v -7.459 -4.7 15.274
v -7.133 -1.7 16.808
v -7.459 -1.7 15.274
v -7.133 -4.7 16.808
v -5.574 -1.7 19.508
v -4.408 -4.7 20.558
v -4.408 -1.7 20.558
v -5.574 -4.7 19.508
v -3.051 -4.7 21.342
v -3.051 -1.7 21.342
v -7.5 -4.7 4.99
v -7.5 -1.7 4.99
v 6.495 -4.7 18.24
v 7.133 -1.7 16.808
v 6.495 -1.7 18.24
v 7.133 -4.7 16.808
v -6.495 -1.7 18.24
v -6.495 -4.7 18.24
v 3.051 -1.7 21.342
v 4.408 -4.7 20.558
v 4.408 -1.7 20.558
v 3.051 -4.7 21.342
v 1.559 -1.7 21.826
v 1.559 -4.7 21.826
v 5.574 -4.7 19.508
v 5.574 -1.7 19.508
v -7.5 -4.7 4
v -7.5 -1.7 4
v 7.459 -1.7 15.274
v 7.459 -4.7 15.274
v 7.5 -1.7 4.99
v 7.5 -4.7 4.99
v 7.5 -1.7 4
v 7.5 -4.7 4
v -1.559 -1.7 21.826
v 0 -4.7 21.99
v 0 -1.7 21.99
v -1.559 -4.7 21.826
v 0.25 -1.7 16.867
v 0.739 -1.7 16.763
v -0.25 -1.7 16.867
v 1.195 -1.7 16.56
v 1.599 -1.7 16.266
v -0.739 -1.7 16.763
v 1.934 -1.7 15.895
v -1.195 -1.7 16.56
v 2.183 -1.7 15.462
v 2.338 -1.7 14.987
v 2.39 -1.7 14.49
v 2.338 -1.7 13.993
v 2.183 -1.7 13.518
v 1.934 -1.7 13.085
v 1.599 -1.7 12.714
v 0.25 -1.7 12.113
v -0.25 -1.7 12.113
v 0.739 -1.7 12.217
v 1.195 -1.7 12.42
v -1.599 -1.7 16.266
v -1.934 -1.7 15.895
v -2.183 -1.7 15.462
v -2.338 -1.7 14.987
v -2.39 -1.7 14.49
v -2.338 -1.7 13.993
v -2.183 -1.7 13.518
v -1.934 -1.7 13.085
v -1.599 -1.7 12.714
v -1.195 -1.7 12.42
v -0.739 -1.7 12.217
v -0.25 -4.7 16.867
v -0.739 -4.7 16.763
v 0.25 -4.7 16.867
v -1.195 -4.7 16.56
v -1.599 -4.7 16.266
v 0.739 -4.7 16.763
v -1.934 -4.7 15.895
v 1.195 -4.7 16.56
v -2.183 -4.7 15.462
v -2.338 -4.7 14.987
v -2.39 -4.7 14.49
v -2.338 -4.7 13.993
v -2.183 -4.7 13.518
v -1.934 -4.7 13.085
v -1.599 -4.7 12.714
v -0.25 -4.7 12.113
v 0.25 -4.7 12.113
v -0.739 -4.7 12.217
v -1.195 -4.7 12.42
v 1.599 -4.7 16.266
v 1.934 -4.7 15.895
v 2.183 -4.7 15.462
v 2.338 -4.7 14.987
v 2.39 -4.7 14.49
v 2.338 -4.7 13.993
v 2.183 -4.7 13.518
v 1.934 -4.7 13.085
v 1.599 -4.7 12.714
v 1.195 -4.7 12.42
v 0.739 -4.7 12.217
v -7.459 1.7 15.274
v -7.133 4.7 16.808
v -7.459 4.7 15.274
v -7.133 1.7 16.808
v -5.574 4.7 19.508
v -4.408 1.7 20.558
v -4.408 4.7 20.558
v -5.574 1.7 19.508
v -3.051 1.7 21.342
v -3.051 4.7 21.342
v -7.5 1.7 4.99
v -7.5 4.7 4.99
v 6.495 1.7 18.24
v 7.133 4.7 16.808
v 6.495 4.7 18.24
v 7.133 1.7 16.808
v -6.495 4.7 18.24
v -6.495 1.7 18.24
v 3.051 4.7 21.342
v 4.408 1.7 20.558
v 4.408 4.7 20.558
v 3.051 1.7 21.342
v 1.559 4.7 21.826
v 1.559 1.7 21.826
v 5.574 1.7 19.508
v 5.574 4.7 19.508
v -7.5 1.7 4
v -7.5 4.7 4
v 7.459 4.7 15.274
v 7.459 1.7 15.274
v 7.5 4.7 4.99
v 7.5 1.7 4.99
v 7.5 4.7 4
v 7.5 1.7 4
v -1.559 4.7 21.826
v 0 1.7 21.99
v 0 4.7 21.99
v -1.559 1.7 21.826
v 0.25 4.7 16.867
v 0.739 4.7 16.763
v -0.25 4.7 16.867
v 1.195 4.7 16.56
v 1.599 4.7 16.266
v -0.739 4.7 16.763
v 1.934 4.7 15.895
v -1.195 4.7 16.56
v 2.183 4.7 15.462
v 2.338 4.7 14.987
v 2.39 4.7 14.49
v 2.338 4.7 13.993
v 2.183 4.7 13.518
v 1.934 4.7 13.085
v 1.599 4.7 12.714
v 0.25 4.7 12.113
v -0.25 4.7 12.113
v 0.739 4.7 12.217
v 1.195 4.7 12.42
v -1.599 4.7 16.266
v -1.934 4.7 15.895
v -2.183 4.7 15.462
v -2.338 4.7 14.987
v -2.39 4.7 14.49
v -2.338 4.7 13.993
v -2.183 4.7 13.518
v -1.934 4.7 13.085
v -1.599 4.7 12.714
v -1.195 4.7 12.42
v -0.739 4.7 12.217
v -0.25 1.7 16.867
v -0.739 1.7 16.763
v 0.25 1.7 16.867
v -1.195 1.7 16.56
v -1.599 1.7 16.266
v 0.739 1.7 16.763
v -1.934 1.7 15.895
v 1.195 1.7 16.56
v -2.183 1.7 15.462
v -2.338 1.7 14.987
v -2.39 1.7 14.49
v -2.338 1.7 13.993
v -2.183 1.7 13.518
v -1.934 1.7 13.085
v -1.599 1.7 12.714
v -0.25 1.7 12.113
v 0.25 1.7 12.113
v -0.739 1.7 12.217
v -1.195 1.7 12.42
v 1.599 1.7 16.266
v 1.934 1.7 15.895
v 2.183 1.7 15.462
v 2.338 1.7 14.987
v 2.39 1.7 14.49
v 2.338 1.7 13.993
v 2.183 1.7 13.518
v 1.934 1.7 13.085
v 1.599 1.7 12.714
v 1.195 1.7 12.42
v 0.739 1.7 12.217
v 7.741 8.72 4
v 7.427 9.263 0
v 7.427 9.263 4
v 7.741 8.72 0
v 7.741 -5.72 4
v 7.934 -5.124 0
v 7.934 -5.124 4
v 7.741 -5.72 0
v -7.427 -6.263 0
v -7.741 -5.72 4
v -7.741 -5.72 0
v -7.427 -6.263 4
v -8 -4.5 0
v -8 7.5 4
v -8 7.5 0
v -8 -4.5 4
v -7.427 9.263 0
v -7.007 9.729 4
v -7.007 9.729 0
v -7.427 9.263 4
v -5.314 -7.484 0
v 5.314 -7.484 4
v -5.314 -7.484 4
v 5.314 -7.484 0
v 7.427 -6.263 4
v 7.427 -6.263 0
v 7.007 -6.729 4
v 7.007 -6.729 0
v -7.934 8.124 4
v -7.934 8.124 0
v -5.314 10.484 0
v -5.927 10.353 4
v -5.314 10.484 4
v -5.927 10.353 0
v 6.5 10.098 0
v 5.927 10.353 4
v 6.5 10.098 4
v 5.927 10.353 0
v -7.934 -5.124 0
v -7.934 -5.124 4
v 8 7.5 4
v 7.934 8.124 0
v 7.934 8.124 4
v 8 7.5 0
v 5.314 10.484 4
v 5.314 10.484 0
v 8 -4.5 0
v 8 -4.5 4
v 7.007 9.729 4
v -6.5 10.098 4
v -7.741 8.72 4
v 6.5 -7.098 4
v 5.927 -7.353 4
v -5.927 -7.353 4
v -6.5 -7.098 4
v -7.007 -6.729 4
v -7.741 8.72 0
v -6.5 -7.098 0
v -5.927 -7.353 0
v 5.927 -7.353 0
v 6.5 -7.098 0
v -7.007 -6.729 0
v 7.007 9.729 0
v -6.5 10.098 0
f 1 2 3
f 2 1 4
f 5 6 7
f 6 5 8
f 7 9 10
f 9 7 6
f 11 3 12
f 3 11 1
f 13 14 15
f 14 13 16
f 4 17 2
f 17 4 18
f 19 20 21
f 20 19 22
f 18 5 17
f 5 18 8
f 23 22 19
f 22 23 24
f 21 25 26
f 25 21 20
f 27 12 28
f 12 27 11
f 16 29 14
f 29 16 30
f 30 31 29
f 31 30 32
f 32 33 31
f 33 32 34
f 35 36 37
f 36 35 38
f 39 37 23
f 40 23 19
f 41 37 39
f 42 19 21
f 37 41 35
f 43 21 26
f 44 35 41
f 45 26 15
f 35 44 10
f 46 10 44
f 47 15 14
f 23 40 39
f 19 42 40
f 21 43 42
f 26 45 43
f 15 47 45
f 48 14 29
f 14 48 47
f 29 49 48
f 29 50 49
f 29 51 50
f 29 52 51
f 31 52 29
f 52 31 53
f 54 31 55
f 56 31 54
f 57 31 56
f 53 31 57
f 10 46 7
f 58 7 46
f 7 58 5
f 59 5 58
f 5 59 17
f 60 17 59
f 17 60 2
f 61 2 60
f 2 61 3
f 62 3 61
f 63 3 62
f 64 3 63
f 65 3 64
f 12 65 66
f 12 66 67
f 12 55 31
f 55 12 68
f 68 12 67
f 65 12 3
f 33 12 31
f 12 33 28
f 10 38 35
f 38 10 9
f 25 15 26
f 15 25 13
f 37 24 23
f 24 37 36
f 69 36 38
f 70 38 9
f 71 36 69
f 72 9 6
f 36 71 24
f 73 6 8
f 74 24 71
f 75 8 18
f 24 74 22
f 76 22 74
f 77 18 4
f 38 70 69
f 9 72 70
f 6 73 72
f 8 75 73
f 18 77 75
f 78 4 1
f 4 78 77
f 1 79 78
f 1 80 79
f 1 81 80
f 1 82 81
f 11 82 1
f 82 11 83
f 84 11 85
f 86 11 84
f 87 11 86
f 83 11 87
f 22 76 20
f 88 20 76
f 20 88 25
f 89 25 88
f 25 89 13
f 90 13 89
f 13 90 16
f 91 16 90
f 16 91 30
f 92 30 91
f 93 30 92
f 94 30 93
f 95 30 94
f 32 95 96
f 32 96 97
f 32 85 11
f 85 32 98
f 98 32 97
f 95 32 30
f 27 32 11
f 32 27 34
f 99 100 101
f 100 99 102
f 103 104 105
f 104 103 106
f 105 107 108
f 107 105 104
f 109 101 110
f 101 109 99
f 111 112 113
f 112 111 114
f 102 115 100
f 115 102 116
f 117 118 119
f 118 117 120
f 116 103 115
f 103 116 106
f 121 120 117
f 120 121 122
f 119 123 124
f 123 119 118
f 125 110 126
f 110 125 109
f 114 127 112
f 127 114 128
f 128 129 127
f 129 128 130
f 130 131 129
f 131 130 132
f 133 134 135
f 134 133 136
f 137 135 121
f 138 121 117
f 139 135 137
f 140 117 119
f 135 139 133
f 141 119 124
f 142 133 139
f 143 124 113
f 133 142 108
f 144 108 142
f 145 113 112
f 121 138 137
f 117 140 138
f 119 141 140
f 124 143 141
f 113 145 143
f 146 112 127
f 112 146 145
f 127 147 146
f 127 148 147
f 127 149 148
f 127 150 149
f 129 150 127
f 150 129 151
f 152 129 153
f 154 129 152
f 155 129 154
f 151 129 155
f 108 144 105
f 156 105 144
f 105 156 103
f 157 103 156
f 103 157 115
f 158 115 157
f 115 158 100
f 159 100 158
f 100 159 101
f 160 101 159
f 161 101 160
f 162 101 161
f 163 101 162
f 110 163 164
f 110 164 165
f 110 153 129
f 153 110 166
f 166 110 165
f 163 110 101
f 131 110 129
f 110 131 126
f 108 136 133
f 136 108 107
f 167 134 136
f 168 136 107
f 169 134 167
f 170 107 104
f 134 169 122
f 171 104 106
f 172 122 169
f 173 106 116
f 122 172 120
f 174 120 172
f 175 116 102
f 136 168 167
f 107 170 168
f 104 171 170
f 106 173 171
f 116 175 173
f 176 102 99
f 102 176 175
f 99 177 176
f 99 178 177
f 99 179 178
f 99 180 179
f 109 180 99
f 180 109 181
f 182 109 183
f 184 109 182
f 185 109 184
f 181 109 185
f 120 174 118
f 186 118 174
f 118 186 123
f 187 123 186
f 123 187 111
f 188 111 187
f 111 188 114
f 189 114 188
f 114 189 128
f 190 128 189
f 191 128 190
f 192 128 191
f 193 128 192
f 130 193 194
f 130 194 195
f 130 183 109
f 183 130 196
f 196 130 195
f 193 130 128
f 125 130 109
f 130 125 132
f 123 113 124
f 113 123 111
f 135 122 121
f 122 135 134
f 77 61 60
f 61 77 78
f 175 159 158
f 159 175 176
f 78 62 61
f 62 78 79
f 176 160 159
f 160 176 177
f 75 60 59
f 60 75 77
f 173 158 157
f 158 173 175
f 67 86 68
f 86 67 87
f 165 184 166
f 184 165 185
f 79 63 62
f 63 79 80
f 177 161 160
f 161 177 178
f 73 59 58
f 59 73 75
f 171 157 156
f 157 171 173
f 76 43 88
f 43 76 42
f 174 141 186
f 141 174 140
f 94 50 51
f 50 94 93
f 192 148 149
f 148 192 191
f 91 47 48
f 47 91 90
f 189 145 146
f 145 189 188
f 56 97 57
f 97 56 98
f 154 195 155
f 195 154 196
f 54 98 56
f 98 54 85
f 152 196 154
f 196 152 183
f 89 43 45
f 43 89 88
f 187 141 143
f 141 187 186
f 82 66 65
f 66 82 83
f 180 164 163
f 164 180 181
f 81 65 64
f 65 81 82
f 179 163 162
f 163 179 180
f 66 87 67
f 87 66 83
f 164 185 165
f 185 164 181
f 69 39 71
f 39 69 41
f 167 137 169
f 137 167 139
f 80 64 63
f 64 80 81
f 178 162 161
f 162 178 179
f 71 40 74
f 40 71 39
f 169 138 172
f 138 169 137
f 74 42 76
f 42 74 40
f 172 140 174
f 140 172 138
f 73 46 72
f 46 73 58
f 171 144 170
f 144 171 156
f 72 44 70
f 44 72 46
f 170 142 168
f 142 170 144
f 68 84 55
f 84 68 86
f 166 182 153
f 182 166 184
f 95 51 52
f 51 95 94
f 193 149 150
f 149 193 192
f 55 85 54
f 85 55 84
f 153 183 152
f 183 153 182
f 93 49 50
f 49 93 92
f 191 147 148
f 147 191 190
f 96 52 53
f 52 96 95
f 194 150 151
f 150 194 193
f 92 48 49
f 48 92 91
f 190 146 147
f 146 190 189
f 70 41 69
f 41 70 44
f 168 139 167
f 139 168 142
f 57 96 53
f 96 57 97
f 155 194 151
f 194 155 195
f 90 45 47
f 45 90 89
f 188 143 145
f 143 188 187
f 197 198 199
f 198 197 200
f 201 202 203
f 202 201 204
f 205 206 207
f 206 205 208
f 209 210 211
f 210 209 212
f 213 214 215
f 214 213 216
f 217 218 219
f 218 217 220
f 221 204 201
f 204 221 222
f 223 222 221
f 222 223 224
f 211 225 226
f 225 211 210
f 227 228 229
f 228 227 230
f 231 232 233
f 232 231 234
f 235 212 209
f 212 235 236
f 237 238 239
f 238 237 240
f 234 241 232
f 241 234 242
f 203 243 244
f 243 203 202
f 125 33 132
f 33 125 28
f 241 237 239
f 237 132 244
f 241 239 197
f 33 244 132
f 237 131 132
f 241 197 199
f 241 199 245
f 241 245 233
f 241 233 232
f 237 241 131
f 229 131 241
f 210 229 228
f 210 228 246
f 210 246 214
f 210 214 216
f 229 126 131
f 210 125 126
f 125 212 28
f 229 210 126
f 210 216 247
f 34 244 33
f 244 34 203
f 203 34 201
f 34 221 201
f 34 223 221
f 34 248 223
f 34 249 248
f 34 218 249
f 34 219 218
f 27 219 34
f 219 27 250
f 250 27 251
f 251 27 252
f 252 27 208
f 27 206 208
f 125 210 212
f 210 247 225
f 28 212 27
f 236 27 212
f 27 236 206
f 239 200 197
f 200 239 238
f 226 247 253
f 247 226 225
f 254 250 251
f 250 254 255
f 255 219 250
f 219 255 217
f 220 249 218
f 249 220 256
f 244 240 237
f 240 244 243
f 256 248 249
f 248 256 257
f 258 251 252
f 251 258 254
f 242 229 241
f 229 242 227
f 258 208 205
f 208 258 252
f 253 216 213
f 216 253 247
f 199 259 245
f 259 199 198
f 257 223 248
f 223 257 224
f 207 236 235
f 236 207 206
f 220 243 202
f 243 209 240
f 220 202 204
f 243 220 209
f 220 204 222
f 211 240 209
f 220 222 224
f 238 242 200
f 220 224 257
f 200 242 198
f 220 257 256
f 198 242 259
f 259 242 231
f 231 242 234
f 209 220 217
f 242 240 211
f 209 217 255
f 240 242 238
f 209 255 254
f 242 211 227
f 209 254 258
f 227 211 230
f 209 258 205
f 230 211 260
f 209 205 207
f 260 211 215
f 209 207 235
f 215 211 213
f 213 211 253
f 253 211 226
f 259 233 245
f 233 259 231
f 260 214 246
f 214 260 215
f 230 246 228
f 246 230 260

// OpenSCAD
$fn=30;

// translate([-12,-14,40]) 
// rotate([-90,0,0])

connWidth  = 3;
boltDepth  = 3;
nutDepth   = 1.75;
slop       = 0.4;
connLength = 18;

/*
translate([-30,30,0]) mount();

translate([-30,0,0]) difference() {
    midPiece();
    translate([-15,-15,-30]) cube([30,30,30],center=false);
}

translate([-30,-30,0]) difference() {
    rotate([180,0,0]) midPiece();
    translate([-15,-15,-30]) cube([30,30,30],center=false);
}
*/

cameraBracket();

/******** MAJOR COMPONENT MODULES ********/
module cameraBracket() {
	translate([-5,-1 * connWidth * 1.5]) linear_extrude(height=4) {
	    minkowski() {
		square([10,connWidth*3 + 3]);
		circle(r=3);
	    }
	}
	translate([0,0,3.99]) rotate([0,0,90]) doubleConnector();
}

/* mount() -- Mount to be attached to back wall of printer
 */
// mount();
module mount() {
    /* plate with mounting holes */
    translate([-9,-9,0]) {
	difference() {
	    linear_extrude(height=4) {
		minkowski() {
		    translate([-3,0,0]) square([22,18]);
		    circle(r=3);
		}
	    }
	    /* remove mounting holes */
	    translate([0,3,2]) rotate([180,0,0]) std1032BoltHole();
	    translate([0,15,2]) rotate([180,0,0]) std1032BoltHole();
	}
    }
    
    /* connector on plate */
    translate([3.5,0,2]) rotate([0,0,90]) {
	tripleConnector();
    }
}

// midPiece();
module midPiece(width=connWidth) {
    translate([-12/2,-19/2, -2])
	linear_extrude(height=4) {
	minkowski() {
	    square([12,18]);
	    circle(r=3);
	}
    }
    
    rotate([180,0,0]) {
	doubleConnector();
    }
    
    rotate([0,0,90]) {
	tripleConnector();
    }
}

/******** BUILDING BLOCK MODULES ********/

/* doubleConnector -- two-component connector
 */
module doubleConnector() {
    difference() {
	union() color("red") {
	    translate([-1 * (connWidth + slop/2), 0, 0]) connectorBit();
	    translate([connWidth + slop/2, 0, 0]) connectorBit();
	}
	boltHoles();
    }
}

/* tripleConnector() -- three-component connector
 */
// tripleConnector();
module tripleConnector() {
    difference() {
	union() {
	    connectorBit();
	    translate([-1 * ((connWidth + boltDepth)/2 + 1.5 * connWidth + slop),0,0])
		connectorBit(width=connWidth+boltDepth);
	    translate([(connWidth + nutDepth)/2 + 1.5 * connWidth + slop,0,0])
		connectorBit(width=connWidth+nutDepth);
	}
	boltHoles();
    }
}

/* boltHoles() -- standard positioning of bolt/nut holes
 */
module boltHoles() {
    rotate([0,0,90]) color("blue") {
	translate([0,7,connLength - 7.5]) rotate([90,0,0])
	    std1032BoltHole();	
	translate([0,-7,connLength - 7.5]) rotate([90,90,0])
	    std1032NutHole();
    }
}

/* connectorBit() -- create a single U-shaped connector piece.
 *
 * Notes:
 * - connector is aligned in YZ plane, centered at X=0.
 * - width parameter controls the "thickness" in the X dimension.
 */
// connectorBit();
module connectorBit(width=connWidth, length=connLength) {
    myRadius = 7.5;
    myLength = max(2*myRadius,length);

    rotate([0,-90,0]) translate([0,-1*myRadius,-0.5*width]) {
	linear_extrude(height=width) hull() {
	    square([1,2 * myRadius]);
	    translate([myLength - myRadius,myRadius]) circle(r=myRadius);
	}
    }
}

// Approach taken from MCAD.
//
// Modified for #10-32 machine screw and nut
//   http://www.smithfast.com/msthreaddims.html
//   http://www.mcfeelys.com/tech/dimensions.htm
//
module std1032BoltHole(length=30, tolerance = +0.0001)
{
    radius = 4.78/2 + tolerance; // listed tolerance is .0028 in
    //capHeight = (.097 * 25.4) + tolerance;
    capHeight = 4.82 + tolerance;
    capRadius = 7.82/2 + tolerance;

    translate([0, 0, -capHeight+tolerance]) cylinder(r= capRadius, h=capHeight);
    cylinder(r = radius, h = length);
}

module std1032NutHole(tolerance = +0.0001)
{
    radius = 10.44/2+tolerance;
    height = 3.18+tolerance;

    cylinder(r= radius, h=height, $fn = 6, center=[0,0]);
}


/******** ATTIC ********/
module oldCameraBracket() {
    myBracketRad = 6/2+.1;
    difference() {
	union() {
	    cylinder(r=myBracketRad,h=28);
	    translate([0,-2,0]) cube([7,4,28]);
	}

	translate([0,0,(28-8)/2])
	    cylinder(r=4.5, h=8);
	translate([0,0,-0.001])
	    cylinder(r=3.5/2, h=28 + 0.002);
    }

    translate([4,0,14]) rotate([90,0,90]) {
	translate([-5,-1 * connWidth * 1.5]) linear_extrude(height=4) {
	    minkowski() {
		square([10,connWidth*3]);
		circle(r=3);
	    }
	}
	translate([0,0,2]) rotate([0,0,90]) doubleConnector();
    }
}

/*
 * Local variables:
 *  mode: C
 *  c-indent-level: 4
 *  c-basic-offset: 4
 * End:
 */
